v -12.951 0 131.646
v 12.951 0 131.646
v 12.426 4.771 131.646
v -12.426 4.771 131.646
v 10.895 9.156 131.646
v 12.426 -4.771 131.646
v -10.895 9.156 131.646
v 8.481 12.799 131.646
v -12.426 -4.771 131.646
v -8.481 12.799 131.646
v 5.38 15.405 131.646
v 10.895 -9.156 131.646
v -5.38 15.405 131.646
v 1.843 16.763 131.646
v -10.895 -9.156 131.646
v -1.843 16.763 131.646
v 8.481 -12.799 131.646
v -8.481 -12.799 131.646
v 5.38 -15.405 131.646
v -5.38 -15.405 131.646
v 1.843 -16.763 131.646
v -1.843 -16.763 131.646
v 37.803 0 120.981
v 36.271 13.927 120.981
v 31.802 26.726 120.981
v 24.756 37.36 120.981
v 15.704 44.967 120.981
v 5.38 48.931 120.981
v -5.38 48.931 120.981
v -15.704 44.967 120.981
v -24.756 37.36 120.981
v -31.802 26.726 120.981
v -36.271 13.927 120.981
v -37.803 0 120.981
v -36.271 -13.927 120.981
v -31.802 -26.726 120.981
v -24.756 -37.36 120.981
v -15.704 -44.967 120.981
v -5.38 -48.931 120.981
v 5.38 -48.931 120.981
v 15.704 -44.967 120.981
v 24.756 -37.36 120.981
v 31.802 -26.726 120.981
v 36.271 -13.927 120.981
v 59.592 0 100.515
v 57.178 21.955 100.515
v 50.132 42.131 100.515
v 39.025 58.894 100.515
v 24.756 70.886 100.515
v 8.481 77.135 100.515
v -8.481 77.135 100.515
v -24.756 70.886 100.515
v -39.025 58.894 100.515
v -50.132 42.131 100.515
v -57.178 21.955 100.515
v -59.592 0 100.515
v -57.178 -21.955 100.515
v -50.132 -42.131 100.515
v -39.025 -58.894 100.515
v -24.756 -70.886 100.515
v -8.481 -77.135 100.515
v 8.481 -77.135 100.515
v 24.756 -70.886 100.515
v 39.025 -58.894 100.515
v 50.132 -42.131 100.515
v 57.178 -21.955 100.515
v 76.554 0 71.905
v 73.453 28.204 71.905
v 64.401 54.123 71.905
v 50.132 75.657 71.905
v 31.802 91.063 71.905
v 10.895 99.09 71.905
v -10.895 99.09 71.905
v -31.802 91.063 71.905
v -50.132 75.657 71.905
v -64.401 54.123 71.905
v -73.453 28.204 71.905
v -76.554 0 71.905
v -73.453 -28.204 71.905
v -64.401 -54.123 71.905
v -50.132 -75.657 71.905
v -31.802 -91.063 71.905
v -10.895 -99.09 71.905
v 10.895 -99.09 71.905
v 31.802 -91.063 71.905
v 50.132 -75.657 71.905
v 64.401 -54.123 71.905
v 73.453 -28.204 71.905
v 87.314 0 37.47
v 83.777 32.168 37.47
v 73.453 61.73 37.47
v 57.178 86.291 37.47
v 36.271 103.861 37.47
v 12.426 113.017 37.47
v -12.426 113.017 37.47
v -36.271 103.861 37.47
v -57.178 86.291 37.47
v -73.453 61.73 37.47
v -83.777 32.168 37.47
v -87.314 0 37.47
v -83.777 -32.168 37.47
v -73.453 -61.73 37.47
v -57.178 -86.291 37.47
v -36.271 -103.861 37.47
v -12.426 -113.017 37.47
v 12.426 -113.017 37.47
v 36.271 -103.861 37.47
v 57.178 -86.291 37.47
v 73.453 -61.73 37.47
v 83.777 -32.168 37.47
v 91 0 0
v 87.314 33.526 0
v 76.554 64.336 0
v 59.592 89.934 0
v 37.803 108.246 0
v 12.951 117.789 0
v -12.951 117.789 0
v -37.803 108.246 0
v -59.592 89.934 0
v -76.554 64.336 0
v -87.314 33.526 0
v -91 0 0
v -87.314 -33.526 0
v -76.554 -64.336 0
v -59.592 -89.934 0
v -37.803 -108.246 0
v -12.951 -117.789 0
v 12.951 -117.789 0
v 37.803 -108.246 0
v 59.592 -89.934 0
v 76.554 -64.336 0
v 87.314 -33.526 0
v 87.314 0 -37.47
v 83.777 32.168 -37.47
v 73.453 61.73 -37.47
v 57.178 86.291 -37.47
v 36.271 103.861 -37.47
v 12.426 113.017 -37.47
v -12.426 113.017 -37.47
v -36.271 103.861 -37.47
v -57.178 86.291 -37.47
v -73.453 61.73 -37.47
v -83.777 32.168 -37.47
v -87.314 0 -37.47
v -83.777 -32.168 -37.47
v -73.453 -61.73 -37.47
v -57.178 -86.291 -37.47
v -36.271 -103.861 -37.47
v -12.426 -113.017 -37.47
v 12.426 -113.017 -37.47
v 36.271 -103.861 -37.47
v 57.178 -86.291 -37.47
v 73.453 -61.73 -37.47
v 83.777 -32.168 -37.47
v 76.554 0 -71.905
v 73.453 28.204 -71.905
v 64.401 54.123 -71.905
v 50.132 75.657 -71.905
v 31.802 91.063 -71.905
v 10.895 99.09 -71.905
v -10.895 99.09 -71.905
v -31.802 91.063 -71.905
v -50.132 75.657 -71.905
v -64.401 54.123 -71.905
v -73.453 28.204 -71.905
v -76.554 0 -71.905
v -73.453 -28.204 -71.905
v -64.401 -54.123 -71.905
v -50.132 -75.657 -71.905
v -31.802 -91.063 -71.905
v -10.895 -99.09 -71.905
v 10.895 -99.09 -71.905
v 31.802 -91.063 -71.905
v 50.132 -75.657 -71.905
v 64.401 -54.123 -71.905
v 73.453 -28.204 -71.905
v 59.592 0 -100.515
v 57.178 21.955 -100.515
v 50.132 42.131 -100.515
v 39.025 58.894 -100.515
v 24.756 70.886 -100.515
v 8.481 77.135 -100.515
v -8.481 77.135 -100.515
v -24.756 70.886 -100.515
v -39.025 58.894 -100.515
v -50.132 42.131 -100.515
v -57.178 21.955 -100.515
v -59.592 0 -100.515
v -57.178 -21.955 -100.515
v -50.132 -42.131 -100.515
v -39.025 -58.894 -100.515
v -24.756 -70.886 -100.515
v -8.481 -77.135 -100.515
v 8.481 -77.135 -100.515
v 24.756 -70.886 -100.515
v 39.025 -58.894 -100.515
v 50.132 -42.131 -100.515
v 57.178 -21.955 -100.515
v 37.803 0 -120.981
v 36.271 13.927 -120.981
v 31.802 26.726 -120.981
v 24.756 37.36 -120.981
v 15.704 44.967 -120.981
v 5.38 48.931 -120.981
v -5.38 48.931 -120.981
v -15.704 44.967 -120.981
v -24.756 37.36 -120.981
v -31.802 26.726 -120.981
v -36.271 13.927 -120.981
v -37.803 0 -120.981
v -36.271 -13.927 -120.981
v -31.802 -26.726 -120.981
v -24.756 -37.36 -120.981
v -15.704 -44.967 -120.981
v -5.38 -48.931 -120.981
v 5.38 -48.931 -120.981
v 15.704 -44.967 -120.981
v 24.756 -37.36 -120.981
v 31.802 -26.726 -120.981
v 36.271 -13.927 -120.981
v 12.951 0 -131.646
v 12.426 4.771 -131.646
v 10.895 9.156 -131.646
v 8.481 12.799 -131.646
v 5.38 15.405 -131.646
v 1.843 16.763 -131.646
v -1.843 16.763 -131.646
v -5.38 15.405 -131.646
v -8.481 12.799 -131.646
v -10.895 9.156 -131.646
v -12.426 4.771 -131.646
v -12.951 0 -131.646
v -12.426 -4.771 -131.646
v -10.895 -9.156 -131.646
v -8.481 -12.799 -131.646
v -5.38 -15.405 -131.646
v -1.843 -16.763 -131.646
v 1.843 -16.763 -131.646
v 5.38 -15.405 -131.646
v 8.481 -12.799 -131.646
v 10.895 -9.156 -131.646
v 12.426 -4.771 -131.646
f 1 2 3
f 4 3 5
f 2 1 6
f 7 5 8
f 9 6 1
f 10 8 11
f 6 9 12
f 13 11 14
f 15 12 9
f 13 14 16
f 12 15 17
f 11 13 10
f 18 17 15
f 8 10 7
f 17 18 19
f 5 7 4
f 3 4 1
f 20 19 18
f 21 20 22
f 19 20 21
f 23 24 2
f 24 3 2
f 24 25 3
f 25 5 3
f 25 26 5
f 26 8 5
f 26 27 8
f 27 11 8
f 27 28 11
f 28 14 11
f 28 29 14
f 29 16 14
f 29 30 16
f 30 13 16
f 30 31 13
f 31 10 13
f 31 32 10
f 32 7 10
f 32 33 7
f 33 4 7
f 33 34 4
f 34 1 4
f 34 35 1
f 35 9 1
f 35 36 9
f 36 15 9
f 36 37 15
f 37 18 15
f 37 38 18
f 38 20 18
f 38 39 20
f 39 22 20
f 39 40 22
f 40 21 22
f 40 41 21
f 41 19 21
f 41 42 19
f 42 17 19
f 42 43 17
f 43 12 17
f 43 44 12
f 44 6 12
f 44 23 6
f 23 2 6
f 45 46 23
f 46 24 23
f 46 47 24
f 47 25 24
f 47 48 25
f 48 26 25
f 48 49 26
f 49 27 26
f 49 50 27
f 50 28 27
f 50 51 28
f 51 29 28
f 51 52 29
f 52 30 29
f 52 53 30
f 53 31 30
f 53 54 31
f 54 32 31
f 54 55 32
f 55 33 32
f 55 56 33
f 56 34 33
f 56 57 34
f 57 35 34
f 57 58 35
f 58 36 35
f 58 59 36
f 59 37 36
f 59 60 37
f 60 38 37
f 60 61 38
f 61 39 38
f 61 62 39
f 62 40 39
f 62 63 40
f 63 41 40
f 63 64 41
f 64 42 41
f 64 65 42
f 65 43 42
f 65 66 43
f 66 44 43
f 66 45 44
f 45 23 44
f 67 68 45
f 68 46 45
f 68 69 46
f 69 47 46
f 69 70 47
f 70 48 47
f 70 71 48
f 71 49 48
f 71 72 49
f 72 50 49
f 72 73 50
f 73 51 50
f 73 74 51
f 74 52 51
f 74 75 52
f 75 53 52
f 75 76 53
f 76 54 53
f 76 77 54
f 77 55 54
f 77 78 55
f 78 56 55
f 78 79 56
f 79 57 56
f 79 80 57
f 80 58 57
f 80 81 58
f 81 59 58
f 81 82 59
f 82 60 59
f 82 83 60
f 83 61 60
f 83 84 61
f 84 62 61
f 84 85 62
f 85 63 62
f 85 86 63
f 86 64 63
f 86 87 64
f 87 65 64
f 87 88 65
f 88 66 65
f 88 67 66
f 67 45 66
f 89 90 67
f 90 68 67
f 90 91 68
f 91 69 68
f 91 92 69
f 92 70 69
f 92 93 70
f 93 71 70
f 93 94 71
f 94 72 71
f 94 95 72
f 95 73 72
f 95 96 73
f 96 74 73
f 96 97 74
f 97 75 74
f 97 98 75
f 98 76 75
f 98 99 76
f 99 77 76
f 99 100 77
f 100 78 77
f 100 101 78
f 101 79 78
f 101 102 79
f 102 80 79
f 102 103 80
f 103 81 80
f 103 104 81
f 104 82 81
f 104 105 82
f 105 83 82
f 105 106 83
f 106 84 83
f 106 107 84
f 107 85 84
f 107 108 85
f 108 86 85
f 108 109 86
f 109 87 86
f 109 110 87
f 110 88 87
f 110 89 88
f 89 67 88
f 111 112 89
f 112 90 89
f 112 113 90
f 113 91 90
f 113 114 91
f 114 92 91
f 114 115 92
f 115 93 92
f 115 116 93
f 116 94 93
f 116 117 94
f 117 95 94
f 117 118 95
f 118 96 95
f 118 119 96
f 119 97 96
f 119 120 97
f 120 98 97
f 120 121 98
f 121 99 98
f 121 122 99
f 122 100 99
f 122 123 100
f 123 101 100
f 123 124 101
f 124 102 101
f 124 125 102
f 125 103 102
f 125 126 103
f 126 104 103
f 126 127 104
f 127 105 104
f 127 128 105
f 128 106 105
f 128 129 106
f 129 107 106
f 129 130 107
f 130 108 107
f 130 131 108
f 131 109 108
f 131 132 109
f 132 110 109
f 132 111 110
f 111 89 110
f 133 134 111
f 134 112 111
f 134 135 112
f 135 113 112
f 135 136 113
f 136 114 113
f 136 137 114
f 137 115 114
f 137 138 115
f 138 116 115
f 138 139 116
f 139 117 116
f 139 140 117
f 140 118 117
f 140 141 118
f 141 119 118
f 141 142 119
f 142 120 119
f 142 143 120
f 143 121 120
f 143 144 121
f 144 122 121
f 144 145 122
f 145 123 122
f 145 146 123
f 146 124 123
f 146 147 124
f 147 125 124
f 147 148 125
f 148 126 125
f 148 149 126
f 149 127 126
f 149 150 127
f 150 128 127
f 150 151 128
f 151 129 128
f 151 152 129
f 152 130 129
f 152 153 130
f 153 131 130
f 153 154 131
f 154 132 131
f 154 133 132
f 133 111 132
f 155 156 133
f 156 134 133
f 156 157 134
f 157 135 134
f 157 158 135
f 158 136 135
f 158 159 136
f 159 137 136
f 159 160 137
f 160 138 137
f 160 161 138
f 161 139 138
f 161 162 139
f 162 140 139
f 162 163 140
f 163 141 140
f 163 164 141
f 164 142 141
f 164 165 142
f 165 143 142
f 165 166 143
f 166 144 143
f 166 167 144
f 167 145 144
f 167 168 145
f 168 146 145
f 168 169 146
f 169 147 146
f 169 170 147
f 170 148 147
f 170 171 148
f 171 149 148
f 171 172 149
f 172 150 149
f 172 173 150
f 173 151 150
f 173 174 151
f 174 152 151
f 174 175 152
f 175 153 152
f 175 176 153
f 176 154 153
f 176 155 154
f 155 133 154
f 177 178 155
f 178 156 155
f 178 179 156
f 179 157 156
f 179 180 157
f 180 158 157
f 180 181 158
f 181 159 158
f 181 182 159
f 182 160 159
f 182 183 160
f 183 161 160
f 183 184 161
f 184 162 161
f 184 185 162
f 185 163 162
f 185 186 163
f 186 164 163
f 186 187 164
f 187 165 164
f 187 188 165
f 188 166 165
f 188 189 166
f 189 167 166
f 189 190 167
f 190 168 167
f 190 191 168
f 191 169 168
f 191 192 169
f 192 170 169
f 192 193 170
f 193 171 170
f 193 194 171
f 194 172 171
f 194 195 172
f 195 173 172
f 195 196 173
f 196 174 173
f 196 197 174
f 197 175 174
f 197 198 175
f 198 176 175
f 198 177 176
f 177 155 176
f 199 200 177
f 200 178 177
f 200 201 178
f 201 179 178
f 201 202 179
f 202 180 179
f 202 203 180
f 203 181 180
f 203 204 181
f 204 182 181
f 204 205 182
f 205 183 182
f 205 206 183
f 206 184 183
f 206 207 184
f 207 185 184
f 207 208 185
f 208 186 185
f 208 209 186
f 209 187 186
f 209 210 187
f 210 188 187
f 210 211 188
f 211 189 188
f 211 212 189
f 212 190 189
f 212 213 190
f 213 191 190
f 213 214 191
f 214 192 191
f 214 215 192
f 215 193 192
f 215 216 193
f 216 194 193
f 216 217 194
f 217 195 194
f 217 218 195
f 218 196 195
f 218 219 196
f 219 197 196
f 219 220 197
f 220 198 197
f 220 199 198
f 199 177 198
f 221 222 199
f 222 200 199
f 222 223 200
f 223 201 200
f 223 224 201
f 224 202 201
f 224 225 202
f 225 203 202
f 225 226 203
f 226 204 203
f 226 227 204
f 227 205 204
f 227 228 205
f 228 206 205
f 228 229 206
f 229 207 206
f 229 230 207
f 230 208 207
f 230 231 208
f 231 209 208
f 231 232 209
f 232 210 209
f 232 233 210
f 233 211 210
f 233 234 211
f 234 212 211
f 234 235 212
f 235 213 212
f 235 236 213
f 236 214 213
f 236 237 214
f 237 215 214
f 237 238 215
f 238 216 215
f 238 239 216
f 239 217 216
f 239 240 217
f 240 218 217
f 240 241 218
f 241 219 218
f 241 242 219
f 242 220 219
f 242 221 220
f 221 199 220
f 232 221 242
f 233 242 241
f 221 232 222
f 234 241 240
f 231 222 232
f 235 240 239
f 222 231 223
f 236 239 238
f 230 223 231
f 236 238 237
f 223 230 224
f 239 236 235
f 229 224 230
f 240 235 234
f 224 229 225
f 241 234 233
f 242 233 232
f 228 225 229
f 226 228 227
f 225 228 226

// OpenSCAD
// Generated by SolidPython 1.0.1 on 2020-07-29 00:46:51


scale(v = [13, 17, 19]) {
	sphere(r = 7);
}
/***********************************************
*********      SolidPython code:      **********
************************************************
 
# import packages: SolidPython
from solid import *
from solid.utils import *
from itertools import chain, combinations, permutations


class Resize:

    def __init__(self, scad_file):
        self.scad_file = scad_file
        #self.scad_file = import_scad(scad_file)
        # cone/cylinder param:
        self.r1 = 0
        self.r2 = 0
        self.h = 0
        # rectangular prism param:
        self.w = 0
        self.l = 0
        # ellipse param:
        self.r = 0

    # import OpenScad code (file name corresponds to shape)


    # classify shape + parameters
    def assign(self, param1, param2, param3):
        if self.scad_file == 'cone.scad':
            self.r1 = param1
            self.r2 = param2
            self.h = param3
        elif self.scad_file == 'cylinder.scad':
            self.r1 = param1
            self.r2 = param2
            self.h = param3
        elif self.scad_file == 'rectangularPrism.scad':
            self.h = param1
            self.l = param2
            self.w = param3
        else:
            self.r = param1
            self.h = param2

    # resize parameters
    def iterate(self):
        x = range(3, 20, 2)
        i = 1
        if self.scad_file == 'cone.scad':
            tempList = list(permutations(x, 2))
            for temp in tempList:
                param1 = temp[0]
                param2 = temp[1]
                filepath = 'produced_scad_files/' + 'cone' + str(param1) + '_' + str(param2) + '_' + '.scad'
                scad_render_to_file(cylinder(h=param1, r1=param2, r2=0), filepath)

        elif self.scad_file == 'cylinder.scad':
            tempList = list(permutations(x, 3))
            for temp in tempList:
                param1 = temp[0]
                param2 = temp[1]
                filepath = 'produced_scad_files/' + 'cylinder' + str(param1) + '_' + str(param2) + '_' + '.scad'
                scad_render_to_file(cylinder(h=param1, r1=param2, r2=param2), filepath)

        elif self.scad_file == 'rectangularPrism.scad':
            tempList = list(permutations(x, 3))
            for temp in tempList:
                param1 = temp[0]
                param2 = temp[1]
                param3 = temp[2]
                filepath = 'produced_scad_files/' + 'rectangularPrism' + str(param1) + '_' + str(param2) + '_' + str(
                    param3) + '.scad'
                scad_render_to_file(cube(size=(param1, param2, param3)), filepath)

        elif self.scad_file == 'ellipse.scad':
            tempList = list(permutations(x, 4))
            for temp in tempList:
                param1 = temp[0]
                param2 = temp[1]
                param3 = temp[2]
                param4 = temp[3]
                filepath = 'produced_scad_files/' + 'ellipse' + str(param1) + '_' + str(param2) + '_' + str(param3) + '_' + str(param4) + '.scad'
                scad_render_to_file(scale([param1, param2, param3])(sphere(r=param4)), filepath)

    def render_to_scadfile(self):
        scad_render_to_file(scad, 'example.scad') 
 
************************************************/
